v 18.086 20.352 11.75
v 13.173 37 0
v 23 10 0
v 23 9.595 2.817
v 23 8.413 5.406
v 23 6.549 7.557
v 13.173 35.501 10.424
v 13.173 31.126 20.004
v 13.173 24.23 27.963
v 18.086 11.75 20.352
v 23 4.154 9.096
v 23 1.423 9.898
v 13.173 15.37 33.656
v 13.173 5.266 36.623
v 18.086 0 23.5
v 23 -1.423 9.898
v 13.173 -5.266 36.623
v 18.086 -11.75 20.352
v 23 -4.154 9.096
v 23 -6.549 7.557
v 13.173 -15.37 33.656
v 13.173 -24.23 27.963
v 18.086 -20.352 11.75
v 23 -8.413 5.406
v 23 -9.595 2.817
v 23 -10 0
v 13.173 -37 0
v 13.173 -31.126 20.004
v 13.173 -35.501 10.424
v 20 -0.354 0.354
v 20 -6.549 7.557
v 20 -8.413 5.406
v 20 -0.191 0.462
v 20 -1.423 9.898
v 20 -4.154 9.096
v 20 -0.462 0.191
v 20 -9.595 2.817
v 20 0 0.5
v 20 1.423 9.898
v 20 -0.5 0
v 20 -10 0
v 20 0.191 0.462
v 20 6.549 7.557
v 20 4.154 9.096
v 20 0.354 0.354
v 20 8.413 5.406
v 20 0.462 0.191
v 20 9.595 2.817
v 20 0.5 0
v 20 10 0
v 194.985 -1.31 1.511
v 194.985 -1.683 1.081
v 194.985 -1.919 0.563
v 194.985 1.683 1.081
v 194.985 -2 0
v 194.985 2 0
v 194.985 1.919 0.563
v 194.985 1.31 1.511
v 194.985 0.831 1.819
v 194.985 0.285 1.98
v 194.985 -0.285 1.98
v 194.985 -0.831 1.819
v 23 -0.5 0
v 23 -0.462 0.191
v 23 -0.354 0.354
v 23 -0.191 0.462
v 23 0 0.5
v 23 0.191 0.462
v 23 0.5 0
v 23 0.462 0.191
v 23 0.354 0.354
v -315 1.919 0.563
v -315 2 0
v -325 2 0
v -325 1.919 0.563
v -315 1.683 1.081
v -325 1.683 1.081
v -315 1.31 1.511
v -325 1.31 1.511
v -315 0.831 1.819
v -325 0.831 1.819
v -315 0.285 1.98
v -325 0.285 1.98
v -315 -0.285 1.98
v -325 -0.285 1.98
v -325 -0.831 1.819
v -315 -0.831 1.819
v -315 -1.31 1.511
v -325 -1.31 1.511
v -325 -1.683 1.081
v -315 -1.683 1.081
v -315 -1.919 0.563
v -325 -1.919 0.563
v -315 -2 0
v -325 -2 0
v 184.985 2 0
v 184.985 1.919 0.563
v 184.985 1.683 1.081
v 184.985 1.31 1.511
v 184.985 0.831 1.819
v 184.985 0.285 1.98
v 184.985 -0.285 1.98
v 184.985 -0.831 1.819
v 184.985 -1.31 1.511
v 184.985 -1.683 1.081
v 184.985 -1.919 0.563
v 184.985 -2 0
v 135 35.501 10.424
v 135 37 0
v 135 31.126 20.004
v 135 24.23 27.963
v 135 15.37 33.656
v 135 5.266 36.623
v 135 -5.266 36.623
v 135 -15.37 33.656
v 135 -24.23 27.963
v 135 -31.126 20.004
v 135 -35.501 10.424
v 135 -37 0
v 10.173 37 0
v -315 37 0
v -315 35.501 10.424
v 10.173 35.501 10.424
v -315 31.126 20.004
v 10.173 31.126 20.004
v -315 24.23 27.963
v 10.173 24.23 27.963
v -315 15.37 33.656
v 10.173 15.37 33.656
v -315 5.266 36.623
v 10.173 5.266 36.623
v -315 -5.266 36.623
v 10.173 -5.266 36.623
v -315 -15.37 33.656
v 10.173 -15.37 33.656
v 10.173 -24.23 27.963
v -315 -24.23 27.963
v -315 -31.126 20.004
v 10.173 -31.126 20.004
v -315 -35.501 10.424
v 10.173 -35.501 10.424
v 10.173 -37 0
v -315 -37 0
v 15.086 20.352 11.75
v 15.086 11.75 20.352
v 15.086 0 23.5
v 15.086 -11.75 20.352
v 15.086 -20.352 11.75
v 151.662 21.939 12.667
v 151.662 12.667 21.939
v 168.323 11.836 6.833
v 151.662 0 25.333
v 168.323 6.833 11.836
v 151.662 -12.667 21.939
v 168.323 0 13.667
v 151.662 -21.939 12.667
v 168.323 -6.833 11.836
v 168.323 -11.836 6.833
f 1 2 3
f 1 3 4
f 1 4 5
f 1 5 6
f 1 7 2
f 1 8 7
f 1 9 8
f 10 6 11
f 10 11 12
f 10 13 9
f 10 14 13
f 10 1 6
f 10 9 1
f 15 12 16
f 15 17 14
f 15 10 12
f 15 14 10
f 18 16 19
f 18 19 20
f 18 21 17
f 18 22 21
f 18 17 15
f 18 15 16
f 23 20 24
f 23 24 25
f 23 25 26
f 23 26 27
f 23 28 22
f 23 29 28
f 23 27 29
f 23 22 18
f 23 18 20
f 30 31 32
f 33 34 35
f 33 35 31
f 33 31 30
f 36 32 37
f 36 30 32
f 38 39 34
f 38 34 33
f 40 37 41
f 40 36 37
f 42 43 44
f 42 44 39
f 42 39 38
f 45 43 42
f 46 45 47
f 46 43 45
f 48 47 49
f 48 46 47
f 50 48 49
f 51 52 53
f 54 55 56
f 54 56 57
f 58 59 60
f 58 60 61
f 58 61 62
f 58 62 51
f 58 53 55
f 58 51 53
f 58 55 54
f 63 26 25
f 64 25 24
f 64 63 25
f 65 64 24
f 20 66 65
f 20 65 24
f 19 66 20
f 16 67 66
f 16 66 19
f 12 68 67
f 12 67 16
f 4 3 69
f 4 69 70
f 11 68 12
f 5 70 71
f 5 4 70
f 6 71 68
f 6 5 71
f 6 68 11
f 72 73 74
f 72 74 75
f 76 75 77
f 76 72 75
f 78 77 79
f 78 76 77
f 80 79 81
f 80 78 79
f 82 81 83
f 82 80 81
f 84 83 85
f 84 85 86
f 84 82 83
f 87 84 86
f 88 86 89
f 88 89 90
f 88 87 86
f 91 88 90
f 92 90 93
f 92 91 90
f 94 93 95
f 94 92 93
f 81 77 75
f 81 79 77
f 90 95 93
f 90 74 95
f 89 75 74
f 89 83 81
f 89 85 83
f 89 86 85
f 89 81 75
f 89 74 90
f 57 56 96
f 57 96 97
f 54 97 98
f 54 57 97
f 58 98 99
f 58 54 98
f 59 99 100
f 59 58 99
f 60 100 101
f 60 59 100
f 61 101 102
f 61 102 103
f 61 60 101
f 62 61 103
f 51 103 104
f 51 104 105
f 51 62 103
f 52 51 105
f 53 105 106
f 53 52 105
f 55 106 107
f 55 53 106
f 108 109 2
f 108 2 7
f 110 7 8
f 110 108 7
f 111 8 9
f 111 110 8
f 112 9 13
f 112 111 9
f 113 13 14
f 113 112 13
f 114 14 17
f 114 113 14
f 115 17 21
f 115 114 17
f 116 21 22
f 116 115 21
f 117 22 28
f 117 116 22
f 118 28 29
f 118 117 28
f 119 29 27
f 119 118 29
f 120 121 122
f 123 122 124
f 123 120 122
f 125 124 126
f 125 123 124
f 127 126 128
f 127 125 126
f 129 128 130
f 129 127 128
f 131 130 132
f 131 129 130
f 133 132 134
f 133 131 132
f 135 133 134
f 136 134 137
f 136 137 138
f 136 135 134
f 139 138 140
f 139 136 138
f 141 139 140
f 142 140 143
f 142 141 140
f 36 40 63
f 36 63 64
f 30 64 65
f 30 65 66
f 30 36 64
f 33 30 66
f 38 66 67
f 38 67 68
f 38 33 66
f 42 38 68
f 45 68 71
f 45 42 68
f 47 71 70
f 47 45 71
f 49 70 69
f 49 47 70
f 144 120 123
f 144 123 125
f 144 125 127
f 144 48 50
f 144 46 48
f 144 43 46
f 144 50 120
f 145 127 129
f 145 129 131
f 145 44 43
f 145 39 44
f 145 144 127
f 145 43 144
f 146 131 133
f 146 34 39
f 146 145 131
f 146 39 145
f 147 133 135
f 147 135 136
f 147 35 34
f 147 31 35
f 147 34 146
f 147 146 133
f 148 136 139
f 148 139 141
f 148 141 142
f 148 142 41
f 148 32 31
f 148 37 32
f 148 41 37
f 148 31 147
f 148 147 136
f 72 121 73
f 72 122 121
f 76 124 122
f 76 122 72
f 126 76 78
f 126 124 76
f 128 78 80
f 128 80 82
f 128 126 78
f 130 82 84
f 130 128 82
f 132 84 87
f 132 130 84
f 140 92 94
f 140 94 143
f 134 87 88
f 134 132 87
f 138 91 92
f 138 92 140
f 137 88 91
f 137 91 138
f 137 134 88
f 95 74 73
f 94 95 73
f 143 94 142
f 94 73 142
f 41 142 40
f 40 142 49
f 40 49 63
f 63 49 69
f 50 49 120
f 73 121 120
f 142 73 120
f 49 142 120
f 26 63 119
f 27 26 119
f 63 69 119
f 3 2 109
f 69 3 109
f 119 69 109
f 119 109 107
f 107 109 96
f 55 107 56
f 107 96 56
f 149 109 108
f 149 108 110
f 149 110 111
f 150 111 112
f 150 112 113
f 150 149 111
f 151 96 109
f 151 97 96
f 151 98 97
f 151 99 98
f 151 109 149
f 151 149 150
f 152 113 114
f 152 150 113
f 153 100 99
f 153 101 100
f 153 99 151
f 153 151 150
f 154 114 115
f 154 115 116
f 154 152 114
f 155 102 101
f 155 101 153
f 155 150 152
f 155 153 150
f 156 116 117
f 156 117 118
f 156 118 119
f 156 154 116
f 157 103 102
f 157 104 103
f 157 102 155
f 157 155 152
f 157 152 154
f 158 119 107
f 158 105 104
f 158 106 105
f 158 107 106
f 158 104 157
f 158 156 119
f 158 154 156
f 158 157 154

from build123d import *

# Parameters (mm, degrees)
SKETCH5_R          = 0.5
CUT_EXTRUDE1_DEPTH = 10
SKETCH6_W          = 703.629675086
SKETCH6_H          = 157.863240862
CUT_EXTRUDE2_DEPTH = 90


with BuildPart() as part:
    # Sketch1 → Revolve1 (revolve)
    with BuildSketch(Plane.XY):
        Polygon((-315, 2), (-315, 37), (135, 37), (184.985180236, 2), (194.985180236, 2), (194.985180236, 0), (-125, 0), (-325, 0), (-325, 2), align=None)
    revolve(axis=Axis((-125, 0, 0), (1, 0, 0)))


with BuildPart() as body_2:
    # Sketch4 → Revolve2 (revolve)
    with BuildSketch(Plane(origin=(0, 0, 0), x_dir=(1, 0, 0), z_dir=(0, 1, 0))):
        Polygon((23, 0), (23, 10), (13.172803675, 37), (10.172803675, 37), (20, 10), (20, 0), align=None)
    revolve(axis=Axis((20, 0, 0), (1, 0, 0)))

    # Sketch5 → Cut-Extrude1 (cut)
    with BuildSketch(Plane.ZY.offset(-20)):
        Circle(SKETCH5_R)
    extrude(amount=-CUT_EXTRUDE1_DEPTH, mode=Mode.SUBTRACT)


with BuildPart() as part_1:
    add(part.part)

    # Combine1: cut body 2
    add(body_2.part, mode=Mode.SUBTRACT)

    # Sketch6 → Cut-Extrude2 (cut)
    with BuildSketch(Plane.XY):
        Rectangle(SKETCH6_W, SKETCH6_H)
    extrude(amount=-CUT_EXTRUDE2_DEPTH, mode=Mode.SUBTRACT)


solid = part_1.part
